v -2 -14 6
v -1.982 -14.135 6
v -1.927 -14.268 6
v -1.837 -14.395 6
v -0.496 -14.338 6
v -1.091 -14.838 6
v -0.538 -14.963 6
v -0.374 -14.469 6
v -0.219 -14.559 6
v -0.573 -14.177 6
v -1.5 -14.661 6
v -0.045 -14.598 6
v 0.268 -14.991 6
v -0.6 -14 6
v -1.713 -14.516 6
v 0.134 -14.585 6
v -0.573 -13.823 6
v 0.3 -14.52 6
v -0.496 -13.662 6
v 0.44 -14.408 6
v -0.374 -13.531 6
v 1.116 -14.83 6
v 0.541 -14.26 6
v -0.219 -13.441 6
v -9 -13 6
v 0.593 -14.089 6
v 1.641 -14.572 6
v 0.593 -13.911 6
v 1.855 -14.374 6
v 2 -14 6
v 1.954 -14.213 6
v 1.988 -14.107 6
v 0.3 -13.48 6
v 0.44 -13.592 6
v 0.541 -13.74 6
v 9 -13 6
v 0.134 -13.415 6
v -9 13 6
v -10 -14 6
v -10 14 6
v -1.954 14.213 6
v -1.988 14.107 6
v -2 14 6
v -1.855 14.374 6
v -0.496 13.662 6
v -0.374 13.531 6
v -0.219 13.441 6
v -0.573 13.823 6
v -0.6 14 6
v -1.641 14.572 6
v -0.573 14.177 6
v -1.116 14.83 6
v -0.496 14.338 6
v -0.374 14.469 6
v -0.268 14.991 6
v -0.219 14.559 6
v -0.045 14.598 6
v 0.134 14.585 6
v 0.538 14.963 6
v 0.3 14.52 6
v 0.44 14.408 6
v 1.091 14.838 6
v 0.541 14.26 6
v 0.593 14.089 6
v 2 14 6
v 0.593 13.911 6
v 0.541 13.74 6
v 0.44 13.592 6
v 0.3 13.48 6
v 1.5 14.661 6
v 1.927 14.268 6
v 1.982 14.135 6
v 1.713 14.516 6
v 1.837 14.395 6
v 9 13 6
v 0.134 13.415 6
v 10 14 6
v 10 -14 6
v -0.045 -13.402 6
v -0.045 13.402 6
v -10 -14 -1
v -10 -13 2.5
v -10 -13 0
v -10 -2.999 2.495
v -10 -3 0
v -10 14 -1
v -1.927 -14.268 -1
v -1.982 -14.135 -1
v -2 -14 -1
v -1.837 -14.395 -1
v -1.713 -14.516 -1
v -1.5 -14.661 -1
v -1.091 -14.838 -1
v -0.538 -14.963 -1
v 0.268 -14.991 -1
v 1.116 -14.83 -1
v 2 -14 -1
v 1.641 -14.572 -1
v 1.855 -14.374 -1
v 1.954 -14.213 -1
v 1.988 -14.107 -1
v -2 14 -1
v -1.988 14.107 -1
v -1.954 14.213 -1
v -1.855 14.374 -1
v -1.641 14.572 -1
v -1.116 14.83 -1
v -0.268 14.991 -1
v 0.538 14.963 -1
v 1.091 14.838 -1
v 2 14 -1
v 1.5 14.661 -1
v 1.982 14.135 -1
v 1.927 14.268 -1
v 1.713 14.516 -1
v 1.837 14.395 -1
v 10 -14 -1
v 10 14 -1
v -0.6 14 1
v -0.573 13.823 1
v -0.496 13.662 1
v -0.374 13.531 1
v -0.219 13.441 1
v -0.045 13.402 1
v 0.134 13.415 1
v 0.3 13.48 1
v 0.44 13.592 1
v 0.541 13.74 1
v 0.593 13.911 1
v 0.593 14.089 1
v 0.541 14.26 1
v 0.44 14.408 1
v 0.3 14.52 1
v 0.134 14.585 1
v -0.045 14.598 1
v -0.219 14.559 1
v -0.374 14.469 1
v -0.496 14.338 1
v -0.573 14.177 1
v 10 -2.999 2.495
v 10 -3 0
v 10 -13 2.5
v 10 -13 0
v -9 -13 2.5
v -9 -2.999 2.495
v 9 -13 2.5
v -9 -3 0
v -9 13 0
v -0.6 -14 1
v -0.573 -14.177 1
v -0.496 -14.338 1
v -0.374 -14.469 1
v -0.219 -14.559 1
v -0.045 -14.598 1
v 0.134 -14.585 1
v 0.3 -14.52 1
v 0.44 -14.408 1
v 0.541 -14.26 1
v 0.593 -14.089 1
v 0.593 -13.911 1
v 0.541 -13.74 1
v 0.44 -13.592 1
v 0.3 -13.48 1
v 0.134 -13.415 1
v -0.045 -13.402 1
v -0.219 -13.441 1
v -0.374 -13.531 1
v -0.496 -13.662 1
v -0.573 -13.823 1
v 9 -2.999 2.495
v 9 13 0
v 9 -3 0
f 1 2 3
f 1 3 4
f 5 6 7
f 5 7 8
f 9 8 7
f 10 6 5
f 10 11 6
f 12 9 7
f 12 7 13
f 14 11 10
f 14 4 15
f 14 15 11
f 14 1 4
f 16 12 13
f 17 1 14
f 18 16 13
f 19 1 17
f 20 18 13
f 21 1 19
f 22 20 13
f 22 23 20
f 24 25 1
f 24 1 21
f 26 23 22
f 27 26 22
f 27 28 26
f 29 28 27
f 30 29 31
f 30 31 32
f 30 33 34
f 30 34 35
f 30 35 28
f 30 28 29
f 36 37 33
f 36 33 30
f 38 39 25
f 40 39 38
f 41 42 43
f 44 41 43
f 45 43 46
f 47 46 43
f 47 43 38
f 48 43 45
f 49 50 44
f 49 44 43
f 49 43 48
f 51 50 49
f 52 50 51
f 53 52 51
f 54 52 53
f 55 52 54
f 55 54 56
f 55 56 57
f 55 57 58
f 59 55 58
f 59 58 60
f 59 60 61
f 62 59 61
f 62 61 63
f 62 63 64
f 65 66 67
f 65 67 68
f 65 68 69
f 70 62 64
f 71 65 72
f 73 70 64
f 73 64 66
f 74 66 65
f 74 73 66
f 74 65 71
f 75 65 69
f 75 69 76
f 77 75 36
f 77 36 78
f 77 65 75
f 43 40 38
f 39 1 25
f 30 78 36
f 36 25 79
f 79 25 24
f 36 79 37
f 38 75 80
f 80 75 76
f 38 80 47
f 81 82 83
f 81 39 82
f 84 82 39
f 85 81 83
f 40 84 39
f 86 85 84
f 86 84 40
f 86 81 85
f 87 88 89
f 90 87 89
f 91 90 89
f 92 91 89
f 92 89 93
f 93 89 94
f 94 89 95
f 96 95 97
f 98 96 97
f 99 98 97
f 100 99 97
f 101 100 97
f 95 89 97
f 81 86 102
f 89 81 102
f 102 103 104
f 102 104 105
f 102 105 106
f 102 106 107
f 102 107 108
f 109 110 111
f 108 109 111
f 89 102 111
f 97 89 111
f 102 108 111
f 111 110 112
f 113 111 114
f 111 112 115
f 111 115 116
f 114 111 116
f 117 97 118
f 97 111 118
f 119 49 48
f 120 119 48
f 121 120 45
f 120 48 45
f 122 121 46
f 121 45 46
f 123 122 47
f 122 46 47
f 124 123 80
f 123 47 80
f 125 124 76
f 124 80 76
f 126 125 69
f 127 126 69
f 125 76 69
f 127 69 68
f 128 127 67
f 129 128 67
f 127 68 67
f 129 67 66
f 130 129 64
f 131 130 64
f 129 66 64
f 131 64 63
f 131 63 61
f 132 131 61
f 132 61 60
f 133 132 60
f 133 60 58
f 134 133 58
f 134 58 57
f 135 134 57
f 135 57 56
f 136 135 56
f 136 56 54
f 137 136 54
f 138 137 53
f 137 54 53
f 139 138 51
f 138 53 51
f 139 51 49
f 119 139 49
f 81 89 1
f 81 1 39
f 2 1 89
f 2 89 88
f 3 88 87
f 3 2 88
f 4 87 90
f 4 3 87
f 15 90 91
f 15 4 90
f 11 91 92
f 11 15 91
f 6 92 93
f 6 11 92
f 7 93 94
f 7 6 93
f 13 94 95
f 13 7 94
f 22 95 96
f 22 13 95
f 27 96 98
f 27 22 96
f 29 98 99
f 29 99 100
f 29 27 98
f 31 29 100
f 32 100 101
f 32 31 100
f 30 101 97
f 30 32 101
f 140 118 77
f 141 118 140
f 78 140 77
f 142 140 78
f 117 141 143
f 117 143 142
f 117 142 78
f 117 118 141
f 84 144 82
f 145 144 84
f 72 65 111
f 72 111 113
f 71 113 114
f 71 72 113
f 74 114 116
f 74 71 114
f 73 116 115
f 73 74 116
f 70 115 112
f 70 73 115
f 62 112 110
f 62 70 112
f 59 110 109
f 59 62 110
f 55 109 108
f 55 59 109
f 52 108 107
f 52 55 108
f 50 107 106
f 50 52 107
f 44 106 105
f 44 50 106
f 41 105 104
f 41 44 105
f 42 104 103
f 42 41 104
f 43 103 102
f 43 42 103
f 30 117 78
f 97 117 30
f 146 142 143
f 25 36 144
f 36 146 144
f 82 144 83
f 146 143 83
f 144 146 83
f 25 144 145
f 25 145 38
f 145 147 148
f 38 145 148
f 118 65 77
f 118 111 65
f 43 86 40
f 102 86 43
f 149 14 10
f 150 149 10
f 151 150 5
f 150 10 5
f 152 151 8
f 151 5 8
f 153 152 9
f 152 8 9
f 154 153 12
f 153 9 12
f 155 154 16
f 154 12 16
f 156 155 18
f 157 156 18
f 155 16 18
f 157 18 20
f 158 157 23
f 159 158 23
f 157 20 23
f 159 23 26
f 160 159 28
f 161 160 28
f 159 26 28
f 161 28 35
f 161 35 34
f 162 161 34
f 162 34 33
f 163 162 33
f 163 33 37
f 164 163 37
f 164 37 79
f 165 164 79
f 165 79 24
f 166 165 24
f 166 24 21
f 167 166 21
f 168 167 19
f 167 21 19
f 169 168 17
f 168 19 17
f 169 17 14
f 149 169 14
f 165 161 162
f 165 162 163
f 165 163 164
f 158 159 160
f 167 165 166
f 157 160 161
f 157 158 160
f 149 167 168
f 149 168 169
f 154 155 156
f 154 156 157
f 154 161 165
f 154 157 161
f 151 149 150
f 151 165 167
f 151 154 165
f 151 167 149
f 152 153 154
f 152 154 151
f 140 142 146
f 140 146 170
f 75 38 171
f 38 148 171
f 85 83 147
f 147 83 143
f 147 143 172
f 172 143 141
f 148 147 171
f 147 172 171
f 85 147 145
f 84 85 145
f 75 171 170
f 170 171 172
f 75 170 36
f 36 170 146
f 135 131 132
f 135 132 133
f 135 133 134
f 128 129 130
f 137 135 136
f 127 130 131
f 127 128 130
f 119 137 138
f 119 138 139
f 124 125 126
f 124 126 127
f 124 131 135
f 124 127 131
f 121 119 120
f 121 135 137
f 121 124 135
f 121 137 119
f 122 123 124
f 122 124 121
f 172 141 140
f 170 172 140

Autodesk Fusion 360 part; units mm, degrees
sketch "Boceto1" plane through (0, 0, 0) normal (0, 0, 1) x (1, 0, 0)
  line L0 (10, -14) -> (-10, -14)
  line L1 (-10, -14) -> (-10, 14)
  line L2 (-10, 14) -> (10, 14)
  line L3 (10, 14) -> (10, -14)
  line L4 (10, -14) -> (-10, 14) construction
  line L5 (-10, -14) -> (10, 14) construction
  line L6 (9, -13) -> (-9, -13)
  line L7 (-9, -13) -> (-9, 13)
  line L8 (-9, 13) -> (9, 13)
  line L9 (9, 13) -> (9, -13)
  line L10 (9, -13) -> (-9, 13) construction
  line L11 (-9, -13) -> (9, 13) construction
  dimension "d1" = 20
  dimension "d2" = 28
  dimension "d3" = 18
  dimension "d4" = 26
extrude "Extruir1" add sketch "Boceto1" against normal blind 1 contours L0 L1 L2 L3 | L6 L7 L8 L9
extrude "Extruir2" add sketch "Boceto1" along normal blind 6
sketch "Boceto2" plane through (10, 0, 0) normal (1, 0, 0) x (0, 1, 0)
  line L0 (-14, 6) -> (-14, -1)
  line L1 (-14, -1) -> (14, -1)
  line L2 (14, -1) -> (14, 6)
  line L3 (14, 6) -> (-14, 6)
  line L4 (13, 6) -> (-13, 6)
  line L5 (-13, 6) -> (13, 6)
  line L6 (14, 6) -> (-14, 6)
  line L7 (-14, 6) -> (14, 6)
  line L8 (-13, 0) -> (13, 0)
  line L9 (13, 0) -> (13, 6)
  line L10 (13, 6) -> (-13, 6)
  line L11 (-13, 6) -> (-13, 0)
  line L12 (-13, 0) -> (-3, 0)
  line L13 (-3, 0) -> (-2.997, 6)
  line L14 (-13, 6) -> (-2.997, 6)
  line L15 (-13, 0) -> (-13, 2.5)
  line L16 (-13, 2.5) -> (-2.9987, 2.4949)
  line L17 (-2.9987, 2.4949) -> (-3, 0)
  dimension "d9" = 10
  dimension "d12" = 2.5
extrude "Extruir3" cut sketch "Boceto2" against normal blind 28 contours L8 L11 L12 L13 L15 L16 L17
sketch "Boceto3" plane through (0, 0, 6) normal (0, 0, 1) x (-1, 0, 0)
  line L0 (9, -13) -> (-9, -13)
  line L1 (-9, -13) -> (-9, 13)
  line L2 (-9, 13) -> (9, 13)
  line L3 (9, 13) -> (9, -13)
  line L4 (-10, -14) -> (10, -14)
  line L5 (10, -14) -> (10, 14)
  line L6 (10, 14) -> (-10, 14)
  line L7 (-10, 14) -> (-10, -14)
  line L8 (0, -14) -> (2, -14) construction
  ellipse E0 centre (0, -14) end of major axis (2, -14) minor radius 1
  line L9 (0, -15) -> (0, -13) construction
  line L10 (0, 14) -> (2, 14) construction
  ellipse E1 centre (0, 14) end of major axis (2, 14) minor radius 1
  line L11 (-2, 14) -> (2, 14) construction
  line L12 (0, 13) -> (0, 15) construction
  circle A0 centre (0, 14) radius 0.6
  circle A1 centre (0, -14) radius 0.6
  dimension "d15" = 2
  dimension "d17" = 2
  dimension "d18" = 2
  dimension "d19" = 2
  dimension "d20" = 1.2
  dimension "d21" = 1.2
extrude "Extruir4" add sketch "Boceto3" against normal blind 7 contours L4 E0 A1 | L4 A1 | L6 E1 A0 | L6 A0 picked at (-1.4687, -14.1432) picked at (-0.0731, -14.1862) picked at (1.4687, 14.1432) picked at (0.1247, 14.1564)
extrude "Extruir5" cut sketch "Boceto3" against normal blind 5 contours L4 A1 | L4 A1 | L6 A0 | L6 A0
